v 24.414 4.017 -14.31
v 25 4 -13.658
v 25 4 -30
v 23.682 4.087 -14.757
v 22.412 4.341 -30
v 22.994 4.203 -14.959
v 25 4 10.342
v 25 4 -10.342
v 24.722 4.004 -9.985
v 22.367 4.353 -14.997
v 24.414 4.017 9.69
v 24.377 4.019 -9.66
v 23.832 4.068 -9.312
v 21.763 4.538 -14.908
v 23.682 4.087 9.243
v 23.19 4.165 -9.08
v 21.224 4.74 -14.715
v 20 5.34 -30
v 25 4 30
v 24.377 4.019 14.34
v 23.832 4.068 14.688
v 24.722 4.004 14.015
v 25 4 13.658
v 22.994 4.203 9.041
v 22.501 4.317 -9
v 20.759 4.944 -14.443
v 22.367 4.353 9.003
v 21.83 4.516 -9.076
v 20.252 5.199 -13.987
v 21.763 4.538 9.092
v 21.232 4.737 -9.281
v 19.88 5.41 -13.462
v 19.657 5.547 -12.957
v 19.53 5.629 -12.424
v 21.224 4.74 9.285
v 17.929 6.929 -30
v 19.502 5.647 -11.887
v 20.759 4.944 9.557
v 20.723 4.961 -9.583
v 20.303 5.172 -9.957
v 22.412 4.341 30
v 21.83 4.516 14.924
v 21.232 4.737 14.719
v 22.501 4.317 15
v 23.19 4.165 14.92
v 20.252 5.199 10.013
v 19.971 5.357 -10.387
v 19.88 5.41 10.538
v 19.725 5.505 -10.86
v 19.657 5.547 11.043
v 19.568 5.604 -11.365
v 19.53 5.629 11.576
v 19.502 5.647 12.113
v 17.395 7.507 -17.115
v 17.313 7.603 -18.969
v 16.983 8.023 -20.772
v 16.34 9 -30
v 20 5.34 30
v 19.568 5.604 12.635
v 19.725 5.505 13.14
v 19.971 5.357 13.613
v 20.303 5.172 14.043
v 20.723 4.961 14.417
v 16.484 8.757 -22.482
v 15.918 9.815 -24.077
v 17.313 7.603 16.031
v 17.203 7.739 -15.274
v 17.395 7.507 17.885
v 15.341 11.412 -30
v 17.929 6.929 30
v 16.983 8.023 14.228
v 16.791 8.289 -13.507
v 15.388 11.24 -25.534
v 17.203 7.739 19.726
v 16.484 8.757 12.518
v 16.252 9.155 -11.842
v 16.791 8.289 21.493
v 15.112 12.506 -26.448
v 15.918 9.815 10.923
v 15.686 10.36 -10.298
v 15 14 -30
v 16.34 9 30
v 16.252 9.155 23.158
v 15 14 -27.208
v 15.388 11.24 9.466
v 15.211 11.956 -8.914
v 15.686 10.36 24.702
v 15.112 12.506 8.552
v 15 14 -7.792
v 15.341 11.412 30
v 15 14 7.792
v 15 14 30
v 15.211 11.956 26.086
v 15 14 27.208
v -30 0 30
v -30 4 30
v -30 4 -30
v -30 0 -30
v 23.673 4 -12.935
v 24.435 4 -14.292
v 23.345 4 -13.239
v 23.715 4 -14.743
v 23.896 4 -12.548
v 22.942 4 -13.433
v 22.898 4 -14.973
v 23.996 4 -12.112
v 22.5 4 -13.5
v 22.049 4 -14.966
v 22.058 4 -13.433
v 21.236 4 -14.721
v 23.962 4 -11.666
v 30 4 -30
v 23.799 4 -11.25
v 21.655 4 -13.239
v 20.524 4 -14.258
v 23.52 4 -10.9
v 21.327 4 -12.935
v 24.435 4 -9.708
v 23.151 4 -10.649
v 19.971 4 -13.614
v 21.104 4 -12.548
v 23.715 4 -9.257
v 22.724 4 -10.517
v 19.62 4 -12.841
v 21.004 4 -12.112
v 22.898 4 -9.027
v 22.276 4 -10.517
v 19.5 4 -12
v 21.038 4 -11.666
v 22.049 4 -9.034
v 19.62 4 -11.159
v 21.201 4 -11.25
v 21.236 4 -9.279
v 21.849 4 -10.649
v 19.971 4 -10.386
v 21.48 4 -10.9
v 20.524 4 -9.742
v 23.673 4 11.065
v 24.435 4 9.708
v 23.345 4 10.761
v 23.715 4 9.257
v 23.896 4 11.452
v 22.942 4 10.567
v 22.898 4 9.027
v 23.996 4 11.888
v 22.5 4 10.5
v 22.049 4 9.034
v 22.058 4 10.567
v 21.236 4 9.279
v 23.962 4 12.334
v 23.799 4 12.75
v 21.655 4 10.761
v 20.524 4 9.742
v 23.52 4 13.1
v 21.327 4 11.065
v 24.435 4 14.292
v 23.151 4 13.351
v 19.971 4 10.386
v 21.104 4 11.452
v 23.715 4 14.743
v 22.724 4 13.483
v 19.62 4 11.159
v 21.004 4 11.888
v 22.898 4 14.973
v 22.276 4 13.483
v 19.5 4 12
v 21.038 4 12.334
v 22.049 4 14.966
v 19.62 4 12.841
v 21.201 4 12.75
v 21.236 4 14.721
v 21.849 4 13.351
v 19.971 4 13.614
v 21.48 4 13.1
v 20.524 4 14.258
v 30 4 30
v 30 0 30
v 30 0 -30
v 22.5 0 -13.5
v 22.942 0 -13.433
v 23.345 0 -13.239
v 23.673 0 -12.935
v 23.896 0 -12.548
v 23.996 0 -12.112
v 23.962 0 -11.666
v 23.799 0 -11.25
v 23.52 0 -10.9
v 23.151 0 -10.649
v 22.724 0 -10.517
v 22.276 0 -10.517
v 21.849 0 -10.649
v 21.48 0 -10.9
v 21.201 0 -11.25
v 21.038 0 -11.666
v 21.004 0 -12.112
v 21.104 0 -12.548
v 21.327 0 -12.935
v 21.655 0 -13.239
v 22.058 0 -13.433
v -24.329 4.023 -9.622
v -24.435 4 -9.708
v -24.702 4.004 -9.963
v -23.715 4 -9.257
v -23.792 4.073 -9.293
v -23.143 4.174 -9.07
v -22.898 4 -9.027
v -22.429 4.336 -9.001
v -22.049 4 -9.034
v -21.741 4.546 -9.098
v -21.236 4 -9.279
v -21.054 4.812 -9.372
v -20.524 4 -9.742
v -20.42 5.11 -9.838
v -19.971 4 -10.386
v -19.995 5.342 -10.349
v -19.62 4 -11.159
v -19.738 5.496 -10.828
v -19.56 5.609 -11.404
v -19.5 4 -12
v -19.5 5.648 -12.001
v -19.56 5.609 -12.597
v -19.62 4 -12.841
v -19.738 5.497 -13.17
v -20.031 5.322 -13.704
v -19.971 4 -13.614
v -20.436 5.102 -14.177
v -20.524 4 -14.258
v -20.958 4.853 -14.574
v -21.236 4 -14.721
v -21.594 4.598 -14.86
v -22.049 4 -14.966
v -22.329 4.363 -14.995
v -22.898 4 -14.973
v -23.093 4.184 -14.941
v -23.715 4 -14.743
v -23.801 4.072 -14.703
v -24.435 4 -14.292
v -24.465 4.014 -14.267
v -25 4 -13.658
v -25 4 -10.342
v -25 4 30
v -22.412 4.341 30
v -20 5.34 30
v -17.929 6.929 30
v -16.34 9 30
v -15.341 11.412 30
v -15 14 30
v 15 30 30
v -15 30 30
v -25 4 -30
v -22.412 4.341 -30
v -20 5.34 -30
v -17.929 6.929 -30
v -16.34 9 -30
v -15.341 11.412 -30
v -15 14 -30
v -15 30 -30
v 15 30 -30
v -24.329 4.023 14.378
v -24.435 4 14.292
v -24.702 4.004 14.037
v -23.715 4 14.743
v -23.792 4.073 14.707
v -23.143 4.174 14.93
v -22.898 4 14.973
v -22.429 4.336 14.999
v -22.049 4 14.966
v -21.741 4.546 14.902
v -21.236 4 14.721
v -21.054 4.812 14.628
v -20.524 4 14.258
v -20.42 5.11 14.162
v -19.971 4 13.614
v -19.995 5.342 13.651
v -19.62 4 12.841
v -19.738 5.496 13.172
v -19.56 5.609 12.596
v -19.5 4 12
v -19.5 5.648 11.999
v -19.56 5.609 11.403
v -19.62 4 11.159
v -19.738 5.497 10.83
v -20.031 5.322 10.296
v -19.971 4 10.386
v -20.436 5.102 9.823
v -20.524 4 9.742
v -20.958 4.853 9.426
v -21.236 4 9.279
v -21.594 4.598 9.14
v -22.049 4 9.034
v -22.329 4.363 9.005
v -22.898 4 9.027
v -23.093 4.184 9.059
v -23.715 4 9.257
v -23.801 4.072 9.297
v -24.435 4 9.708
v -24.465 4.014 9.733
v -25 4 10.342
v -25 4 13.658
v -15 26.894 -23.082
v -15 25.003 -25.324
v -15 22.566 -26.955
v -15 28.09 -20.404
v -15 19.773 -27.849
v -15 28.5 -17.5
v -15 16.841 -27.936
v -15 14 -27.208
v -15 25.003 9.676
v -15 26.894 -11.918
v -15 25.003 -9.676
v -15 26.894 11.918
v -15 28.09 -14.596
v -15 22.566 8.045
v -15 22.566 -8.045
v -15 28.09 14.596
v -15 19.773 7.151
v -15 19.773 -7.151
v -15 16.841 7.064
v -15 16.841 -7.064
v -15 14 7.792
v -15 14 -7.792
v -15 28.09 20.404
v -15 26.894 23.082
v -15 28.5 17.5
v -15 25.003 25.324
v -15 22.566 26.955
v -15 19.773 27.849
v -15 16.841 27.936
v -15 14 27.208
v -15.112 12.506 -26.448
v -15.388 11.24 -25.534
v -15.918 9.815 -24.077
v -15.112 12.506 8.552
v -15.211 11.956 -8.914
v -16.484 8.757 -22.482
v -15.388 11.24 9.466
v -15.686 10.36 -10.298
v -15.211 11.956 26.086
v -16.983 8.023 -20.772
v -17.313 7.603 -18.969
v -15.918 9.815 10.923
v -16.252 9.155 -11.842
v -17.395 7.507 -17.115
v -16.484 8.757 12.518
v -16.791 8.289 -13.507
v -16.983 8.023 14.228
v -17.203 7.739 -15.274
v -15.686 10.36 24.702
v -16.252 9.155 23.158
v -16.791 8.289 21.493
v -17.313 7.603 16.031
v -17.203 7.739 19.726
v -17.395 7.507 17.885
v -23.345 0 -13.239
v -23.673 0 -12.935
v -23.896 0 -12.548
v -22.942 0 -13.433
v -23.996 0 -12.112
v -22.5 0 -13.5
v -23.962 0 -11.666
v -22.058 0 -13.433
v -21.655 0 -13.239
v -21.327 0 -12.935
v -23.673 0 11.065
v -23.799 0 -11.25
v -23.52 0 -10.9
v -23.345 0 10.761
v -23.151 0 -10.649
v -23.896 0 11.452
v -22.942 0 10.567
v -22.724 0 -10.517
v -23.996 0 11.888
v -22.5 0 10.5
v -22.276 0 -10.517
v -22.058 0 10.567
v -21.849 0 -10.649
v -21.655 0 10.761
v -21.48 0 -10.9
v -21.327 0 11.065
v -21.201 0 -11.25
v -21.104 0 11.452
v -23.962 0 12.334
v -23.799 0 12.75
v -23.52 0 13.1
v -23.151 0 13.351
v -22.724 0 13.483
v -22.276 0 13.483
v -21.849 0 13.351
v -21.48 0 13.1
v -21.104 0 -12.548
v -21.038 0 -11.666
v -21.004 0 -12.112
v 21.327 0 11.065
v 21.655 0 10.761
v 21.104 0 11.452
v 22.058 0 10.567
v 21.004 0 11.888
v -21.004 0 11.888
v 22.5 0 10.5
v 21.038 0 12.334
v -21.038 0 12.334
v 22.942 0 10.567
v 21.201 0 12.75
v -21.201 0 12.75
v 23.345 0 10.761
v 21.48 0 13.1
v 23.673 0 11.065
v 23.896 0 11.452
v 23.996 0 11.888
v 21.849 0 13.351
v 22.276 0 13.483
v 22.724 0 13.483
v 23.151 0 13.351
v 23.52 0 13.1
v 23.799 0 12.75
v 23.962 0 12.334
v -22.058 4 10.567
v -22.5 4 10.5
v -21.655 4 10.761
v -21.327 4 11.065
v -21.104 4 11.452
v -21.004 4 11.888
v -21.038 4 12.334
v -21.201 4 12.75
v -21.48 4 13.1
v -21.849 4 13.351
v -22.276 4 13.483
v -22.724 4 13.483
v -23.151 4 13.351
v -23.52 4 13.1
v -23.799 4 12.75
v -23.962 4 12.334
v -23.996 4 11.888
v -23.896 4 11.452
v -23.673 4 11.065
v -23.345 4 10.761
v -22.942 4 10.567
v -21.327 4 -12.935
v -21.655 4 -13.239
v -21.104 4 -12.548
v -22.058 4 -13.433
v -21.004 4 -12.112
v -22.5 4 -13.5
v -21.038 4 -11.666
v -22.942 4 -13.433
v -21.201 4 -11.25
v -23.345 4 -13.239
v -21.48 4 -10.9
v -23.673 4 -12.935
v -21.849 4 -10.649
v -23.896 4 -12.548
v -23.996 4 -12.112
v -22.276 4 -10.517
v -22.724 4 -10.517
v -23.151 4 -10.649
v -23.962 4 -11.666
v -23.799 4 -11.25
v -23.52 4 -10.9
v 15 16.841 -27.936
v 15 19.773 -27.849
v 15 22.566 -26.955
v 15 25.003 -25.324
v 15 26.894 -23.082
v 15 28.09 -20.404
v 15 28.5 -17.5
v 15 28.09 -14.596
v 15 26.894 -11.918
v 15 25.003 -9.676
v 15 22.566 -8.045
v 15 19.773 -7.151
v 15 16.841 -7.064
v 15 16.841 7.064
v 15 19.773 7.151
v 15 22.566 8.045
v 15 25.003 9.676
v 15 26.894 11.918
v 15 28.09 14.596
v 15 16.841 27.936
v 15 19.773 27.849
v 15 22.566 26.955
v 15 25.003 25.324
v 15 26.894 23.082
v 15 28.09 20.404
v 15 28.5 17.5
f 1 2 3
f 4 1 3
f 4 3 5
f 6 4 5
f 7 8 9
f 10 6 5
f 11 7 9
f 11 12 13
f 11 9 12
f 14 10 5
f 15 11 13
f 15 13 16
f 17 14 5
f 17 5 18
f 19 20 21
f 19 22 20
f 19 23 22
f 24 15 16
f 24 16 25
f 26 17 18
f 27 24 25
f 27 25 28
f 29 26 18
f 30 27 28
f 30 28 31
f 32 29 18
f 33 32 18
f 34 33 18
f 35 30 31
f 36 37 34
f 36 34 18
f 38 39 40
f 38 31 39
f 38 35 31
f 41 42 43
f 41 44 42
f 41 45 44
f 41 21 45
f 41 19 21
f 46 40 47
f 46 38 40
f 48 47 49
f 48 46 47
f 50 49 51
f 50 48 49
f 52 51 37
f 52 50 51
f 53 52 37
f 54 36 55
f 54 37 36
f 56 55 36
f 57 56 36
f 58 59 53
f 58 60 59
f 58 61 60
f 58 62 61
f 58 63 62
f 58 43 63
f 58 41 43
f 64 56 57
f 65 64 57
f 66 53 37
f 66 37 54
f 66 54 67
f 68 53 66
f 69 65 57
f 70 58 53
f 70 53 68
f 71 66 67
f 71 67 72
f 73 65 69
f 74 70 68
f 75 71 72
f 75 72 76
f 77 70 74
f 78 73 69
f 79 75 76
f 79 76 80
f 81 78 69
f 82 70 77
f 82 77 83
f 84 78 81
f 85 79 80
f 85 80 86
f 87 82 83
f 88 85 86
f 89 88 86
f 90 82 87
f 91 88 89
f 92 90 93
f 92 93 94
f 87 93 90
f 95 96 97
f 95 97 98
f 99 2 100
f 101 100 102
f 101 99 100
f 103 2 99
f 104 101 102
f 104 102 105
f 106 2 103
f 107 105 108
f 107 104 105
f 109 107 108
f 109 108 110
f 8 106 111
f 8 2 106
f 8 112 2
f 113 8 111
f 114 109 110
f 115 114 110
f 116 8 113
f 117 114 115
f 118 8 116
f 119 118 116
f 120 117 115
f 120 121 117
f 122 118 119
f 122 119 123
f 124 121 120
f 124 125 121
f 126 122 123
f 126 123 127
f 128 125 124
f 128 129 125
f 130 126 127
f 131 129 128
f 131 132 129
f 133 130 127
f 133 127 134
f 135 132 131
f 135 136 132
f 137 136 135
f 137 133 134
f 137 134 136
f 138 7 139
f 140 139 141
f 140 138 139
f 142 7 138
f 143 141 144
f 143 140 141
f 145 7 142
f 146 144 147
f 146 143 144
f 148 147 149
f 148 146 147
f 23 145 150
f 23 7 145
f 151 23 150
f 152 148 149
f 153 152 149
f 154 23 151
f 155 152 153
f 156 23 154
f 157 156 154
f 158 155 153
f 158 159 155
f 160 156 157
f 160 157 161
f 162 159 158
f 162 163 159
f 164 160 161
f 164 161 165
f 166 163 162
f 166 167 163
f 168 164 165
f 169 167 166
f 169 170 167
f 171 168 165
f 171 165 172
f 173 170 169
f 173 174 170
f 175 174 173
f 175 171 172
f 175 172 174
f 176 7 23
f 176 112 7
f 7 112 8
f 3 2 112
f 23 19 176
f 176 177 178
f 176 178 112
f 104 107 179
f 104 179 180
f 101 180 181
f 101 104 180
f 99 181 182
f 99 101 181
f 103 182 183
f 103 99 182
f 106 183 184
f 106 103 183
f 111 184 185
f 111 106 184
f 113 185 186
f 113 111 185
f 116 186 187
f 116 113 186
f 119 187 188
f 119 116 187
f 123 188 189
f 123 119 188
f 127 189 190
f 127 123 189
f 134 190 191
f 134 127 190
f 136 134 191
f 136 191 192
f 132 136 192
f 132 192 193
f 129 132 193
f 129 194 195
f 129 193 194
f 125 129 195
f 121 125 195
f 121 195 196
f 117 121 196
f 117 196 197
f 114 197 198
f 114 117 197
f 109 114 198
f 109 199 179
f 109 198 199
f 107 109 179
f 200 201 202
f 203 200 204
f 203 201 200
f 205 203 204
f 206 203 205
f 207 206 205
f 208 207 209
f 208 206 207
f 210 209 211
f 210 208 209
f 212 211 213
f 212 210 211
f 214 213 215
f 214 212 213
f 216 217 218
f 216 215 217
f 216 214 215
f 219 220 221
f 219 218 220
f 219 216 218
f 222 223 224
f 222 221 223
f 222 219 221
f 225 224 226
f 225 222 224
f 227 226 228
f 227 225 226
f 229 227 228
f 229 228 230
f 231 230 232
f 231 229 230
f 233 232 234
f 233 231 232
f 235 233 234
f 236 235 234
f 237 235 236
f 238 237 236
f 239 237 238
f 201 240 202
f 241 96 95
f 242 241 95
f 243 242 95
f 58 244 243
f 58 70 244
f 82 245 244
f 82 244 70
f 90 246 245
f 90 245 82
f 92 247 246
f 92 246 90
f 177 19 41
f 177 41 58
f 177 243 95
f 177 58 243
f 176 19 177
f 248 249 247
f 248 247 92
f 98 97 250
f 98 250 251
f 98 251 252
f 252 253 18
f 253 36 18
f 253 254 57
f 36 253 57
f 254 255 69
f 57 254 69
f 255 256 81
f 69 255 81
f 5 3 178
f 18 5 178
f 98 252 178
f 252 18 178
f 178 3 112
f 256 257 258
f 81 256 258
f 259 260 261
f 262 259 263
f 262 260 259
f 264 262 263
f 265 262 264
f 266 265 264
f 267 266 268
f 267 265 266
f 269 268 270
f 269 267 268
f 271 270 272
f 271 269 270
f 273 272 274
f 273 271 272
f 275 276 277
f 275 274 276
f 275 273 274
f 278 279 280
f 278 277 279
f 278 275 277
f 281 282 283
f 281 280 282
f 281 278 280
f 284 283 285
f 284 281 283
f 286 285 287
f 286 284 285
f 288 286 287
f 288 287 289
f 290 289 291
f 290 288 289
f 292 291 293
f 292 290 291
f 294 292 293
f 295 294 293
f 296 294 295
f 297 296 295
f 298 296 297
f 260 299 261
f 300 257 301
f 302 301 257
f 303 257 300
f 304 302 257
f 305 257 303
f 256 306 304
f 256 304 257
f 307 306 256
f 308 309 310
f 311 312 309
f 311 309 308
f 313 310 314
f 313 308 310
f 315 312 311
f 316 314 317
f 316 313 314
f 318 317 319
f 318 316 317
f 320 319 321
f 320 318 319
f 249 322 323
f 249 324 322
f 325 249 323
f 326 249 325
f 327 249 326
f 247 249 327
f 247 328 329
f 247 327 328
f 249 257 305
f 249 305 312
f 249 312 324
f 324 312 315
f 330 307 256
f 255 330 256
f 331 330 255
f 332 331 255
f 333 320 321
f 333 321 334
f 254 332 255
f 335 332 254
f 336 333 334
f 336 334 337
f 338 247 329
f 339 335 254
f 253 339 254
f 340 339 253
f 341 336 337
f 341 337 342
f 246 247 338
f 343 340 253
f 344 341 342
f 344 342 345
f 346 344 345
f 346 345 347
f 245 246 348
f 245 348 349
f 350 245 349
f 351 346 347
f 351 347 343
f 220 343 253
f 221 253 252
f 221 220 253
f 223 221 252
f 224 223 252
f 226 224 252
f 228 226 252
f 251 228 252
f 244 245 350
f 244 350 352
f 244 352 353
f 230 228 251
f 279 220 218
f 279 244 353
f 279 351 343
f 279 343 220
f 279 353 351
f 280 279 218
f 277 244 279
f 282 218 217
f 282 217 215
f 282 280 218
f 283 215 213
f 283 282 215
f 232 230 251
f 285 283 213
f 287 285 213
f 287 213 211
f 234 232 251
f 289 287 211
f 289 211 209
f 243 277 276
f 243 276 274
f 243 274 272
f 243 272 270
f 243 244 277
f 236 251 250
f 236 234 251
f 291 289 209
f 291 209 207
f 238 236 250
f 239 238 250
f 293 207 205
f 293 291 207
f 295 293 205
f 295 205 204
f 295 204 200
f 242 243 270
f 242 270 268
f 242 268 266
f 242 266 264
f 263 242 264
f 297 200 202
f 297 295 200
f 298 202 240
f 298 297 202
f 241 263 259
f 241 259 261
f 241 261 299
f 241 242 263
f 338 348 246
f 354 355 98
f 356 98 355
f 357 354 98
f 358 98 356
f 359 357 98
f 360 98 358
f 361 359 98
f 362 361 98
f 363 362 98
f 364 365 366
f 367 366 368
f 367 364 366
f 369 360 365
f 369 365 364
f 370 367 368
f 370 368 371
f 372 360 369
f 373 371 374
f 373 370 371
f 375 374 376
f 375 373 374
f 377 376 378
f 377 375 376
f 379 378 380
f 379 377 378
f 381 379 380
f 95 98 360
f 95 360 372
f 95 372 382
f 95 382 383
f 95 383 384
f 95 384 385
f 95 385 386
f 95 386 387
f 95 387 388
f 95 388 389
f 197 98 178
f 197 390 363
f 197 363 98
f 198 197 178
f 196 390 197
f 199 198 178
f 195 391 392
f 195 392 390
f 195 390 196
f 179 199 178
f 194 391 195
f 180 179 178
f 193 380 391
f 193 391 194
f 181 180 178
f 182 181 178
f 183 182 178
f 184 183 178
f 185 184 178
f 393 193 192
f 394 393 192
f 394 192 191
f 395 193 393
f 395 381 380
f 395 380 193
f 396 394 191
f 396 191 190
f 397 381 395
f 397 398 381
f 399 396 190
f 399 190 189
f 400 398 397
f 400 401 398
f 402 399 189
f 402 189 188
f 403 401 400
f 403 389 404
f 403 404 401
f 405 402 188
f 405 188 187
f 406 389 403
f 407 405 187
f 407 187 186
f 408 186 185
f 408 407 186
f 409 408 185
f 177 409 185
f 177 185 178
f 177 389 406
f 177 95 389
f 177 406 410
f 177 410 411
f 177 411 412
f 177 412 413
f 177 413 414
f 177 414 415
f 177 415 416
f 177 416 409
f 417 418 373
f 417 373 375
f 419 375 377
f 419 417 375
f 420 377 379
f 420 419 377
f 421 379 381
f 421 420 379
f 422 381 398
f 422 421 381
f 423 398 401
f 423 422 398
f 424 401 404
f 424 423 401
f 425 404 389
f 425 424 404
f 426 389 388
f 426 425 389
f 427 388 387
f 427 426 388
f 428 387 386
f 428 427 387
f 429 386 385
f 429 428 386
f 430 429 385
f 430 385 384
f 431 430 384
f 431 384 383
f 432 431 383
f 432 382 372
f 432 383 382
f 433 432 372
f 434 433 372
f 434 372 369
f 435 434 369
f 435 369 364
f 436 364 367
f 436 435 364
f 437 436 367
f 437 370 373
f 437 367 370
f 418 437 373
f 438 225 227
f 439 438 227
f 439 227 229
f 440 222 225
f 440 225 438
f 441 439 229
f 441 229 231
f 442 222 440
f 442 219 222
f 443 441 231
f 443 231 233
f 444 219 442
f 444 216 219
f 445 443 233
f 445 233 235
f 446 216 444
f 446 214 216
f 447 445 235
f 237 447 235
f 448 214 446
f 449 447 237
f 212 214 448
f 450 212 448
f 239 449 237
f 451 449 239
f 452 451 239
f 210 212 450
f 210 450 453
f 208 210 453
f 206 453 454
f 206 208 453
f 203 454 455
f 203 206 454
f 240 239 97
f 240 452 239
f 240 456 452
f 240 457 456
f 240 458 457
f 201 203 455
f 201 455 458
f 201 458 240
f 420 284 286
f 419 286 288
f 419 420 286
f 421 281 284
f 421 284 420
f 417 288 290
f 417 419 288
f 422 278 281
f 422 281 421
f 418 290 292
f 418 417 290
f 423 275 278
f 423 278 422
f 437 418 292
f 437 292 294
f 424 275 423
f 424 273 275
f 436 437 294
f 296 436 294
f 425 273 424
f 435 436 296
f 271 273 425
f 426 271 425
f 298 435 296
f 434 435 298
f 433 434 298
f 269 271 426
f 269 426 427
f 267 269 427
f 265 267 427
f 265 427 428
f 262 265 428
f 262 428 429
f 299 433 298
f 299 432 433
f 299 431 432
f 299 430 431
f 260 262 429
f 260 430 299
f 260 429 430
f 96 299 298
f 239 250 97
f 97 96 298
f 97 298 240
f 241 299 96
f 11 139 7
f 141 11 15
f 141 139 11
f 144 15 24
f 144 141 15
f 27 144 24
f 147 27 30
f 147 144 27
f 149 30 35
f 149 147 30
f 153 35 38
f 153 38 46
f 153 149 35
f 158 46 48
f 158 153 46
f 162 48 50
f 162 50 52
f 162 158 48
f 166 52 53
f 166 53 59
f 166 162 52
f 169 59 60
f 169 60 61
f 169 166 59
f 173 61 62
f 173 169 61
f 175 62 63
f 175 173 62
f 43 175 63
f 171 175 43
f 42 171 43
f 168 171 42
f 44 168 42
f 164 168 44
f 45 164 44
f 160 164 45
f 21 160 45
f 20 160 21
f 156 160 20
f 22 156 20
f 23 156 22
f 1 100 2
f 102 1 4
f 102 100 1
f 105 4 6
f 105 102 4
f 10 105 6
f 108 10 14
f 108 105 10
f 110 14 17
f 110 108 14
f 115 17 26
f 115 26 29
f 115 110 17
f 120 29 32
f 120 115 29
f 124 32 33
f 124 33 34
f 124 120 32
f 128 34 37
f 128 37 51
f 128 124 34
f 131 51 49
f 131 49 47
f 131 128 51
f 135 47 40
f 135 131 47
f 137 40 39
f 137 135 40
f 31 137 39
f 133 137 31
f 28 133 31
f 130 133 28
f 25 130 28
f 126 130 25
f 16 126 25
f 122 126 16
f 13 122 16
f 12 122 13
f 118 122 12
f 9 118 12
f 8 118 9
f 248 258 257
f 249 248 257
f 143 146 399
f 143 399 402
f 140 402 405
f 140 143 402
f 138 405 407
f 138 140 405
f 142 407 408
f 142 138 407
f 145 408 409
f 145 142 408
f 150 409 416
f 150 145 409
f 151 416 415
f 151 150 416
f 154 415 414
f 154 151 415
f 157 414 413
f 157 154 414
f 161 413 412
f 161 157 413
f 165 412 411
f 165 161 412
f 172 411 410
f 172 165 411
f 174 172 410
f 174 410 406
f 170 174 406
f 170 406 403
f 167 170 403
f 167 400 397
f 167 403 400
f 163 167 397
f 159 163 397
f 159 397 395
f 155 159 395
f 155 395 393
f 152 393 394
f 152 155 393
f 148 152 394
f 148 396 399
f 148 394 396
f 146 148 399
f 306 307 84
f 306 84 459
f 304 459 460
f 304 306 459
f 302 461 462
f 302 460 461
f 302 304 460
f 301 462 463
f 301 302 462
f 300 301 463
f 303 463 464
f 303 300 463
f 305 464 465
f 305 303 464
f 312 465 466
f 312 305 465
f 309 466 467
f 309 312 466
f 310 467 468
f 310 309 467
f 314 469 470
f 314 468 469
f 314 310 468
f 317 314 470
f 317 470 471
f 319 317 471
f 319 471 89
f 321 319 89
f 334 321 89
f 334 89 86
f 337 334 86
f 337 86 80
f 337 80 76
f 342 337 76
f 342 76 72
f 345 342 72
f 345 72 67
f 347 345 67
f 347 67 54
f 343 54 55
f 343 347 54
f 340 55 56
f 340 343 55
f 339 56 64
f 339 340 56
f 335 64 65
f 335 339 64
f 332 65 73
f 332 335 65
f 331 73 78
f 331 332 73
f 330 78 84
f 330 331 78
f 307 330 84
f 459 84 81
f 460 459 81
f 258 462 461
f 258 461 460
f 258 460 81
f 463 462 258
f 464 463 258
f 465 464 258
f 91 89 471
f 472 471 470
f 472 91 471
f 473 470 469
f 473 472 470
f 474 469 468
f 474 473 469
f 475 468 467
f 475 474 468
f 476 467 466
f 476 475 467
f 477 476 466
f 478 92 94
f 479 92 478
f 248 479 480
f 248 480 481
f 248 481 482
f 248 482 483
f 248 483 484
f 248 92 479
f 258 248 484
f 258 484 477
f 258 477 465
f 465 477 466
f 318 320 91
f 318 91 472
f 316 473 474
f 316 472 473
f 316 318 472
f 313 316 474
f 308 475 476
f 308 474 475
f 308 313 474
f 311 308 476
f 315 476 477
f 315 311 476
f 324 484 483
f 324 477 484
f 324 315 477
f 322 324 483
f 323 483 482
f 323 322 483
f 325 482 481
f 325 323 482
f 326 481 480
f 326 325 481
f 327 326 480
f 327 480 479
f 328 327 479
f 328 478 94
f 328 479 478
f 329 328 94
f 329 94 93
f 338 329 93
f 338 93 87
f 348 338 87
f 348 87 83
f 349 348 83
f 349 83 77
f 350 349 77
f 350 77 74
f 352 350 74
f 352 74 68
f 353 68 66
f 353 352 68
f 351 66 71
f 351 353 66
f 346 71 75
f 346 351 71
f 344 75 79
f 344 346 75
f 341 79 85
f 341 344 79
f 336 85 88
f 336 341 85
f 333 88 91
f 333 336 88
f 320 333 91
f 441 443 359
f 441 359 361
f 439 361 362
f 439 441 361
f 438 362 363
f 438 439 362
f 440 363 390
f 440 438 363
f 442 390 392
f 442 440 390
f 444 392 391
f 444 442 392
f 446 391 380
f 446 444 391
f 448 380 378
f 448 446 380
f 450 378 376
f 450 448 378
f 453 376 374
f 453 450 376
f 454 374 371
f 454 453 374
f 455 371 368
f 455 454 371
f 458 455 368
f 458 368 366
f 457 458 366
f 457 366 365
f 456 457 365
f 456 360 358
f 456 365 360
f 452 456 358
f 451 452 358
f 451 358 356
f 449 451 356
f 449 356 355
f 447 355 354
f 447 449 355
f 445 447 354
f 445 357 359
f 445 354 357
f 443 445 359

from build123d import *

# Parameters (mm, degrees)
BOSS_EXTRUDE1_DEPTH     = 30
CUT_EXTRUDE1_DEPTH      = 74.484692283
CUT_EXTRUDE1_DEPTH_BACK = 74.484692283
SKETCH6_R               = 10.5
CUT_EXTRUDE2_DEPTH      = 52.961524285
CUT_EXTRUDE2_DEPTH_BACK = 52.961524285
SKETCH7_R               = 1.5
SKETCH8_R               = 3
CUT_EXTRUDE3_DEPTH      = 10


with BuildPart() as part:
    # Sketch5 → Boss-Extrude1 (new, symmetric)
    with BuildSketch(Plane.XY):
        with BuildLine():
            Line((15, 30), (-15, 30))
            Line((-15, 30), (-15, 14))
            ThreePointArc((-15, 14), (-17.928932188, 6.928932188), (-25, 4))
            Line((-25, 4), (-30, 4))
            Line((-30, 4), (-30, 0))
            Line((-30, 0), (30, 0))
            Line((30, 0), (30, 4))
            Line((30, 4), (25, 4))
            ThreePointArc((25, 4), (17.928932188, 6.928932188), (15, 14))
            Line((15, 14), (15, 30))
        make_face()
    extrude(amount=BOSS_EXTRUDE1_DEPTH, both=True)

    # Sketch6 → Cut-Extrude1 (cut, two sides: drawn at the far end of the back side and taken through both)
    with BuildSketch(Plane(origin=(30, 0, 0), x_dir=(0, 0, -1), z_dir=(1, 0, 0)).offset(-CUT_EXTRUDE1_DEPTH_BACK)):
        with Locations(Location((-17.5, 18, 0), (0, 0, 337.607312195))):
            Circle(SKETCH6_R)
        with Locations(Location((17.5, 18, 0), (0, 0, 337.607312195))):
            Circle(SKETCH6_R)
    extrude(amount=CUT_EXTRUDE1_DEPTH + CUT_EXTRUDE1_DEPTH_BACK, mode=Mode.SUBTRACT)

    # Sketch7 → Cut-Extrude2 (cut, two sides: drawn at the far end of the back side and taken through both)
    with BuildSketch(Plane.XZ.offset(-CUT_EXTRUDE2_DEPTH_BACK)):
        with Locations(Location((-22.5, 12, 0), (0, 0, 270))):
            Circle(SKETCH7_R)
        with Locations(Location((22.5, 12, 0), (0, 0, 270))):
            Circle(SKETCH7_R)
        with Locations(Location((22.5, -12, 0), (0, 0, 270))):
            Circle(SKETCH7_R)
        with Locations(Location((-22.5, -12, 0), (0, 0, 270))):
            Circle(SKETCH7_R)
    extrude(amount=CUT_EXTRUDE2_DEPTH + CUT_EXTRUDE2_DEPTH_BACK, mode=Mode.SUBTRACT)

    # Sketch8 → Cut-Extrude3 (cut)
    with BuildSketch(Plane(origin=(0, 4, 0), x_dir=(1, 0, 0), z_dir=(0, 1, 0))):
        with Locations((22.5, -12)):
            Circle(SKETCH8_R)
        with Locations((22.5, 12)):
            Circle(SKETCH8_R)
        with Locations((-22.5, 12)):
            Circle(SKETCH8_R)
        with Locations((-22.5, -12)):
            Circle(SKETCH8_R)
    extrude(amount=CUT_EXTRUDE3_DEPTH, mode=Mode.SUBTRACT)


solid = part.part
